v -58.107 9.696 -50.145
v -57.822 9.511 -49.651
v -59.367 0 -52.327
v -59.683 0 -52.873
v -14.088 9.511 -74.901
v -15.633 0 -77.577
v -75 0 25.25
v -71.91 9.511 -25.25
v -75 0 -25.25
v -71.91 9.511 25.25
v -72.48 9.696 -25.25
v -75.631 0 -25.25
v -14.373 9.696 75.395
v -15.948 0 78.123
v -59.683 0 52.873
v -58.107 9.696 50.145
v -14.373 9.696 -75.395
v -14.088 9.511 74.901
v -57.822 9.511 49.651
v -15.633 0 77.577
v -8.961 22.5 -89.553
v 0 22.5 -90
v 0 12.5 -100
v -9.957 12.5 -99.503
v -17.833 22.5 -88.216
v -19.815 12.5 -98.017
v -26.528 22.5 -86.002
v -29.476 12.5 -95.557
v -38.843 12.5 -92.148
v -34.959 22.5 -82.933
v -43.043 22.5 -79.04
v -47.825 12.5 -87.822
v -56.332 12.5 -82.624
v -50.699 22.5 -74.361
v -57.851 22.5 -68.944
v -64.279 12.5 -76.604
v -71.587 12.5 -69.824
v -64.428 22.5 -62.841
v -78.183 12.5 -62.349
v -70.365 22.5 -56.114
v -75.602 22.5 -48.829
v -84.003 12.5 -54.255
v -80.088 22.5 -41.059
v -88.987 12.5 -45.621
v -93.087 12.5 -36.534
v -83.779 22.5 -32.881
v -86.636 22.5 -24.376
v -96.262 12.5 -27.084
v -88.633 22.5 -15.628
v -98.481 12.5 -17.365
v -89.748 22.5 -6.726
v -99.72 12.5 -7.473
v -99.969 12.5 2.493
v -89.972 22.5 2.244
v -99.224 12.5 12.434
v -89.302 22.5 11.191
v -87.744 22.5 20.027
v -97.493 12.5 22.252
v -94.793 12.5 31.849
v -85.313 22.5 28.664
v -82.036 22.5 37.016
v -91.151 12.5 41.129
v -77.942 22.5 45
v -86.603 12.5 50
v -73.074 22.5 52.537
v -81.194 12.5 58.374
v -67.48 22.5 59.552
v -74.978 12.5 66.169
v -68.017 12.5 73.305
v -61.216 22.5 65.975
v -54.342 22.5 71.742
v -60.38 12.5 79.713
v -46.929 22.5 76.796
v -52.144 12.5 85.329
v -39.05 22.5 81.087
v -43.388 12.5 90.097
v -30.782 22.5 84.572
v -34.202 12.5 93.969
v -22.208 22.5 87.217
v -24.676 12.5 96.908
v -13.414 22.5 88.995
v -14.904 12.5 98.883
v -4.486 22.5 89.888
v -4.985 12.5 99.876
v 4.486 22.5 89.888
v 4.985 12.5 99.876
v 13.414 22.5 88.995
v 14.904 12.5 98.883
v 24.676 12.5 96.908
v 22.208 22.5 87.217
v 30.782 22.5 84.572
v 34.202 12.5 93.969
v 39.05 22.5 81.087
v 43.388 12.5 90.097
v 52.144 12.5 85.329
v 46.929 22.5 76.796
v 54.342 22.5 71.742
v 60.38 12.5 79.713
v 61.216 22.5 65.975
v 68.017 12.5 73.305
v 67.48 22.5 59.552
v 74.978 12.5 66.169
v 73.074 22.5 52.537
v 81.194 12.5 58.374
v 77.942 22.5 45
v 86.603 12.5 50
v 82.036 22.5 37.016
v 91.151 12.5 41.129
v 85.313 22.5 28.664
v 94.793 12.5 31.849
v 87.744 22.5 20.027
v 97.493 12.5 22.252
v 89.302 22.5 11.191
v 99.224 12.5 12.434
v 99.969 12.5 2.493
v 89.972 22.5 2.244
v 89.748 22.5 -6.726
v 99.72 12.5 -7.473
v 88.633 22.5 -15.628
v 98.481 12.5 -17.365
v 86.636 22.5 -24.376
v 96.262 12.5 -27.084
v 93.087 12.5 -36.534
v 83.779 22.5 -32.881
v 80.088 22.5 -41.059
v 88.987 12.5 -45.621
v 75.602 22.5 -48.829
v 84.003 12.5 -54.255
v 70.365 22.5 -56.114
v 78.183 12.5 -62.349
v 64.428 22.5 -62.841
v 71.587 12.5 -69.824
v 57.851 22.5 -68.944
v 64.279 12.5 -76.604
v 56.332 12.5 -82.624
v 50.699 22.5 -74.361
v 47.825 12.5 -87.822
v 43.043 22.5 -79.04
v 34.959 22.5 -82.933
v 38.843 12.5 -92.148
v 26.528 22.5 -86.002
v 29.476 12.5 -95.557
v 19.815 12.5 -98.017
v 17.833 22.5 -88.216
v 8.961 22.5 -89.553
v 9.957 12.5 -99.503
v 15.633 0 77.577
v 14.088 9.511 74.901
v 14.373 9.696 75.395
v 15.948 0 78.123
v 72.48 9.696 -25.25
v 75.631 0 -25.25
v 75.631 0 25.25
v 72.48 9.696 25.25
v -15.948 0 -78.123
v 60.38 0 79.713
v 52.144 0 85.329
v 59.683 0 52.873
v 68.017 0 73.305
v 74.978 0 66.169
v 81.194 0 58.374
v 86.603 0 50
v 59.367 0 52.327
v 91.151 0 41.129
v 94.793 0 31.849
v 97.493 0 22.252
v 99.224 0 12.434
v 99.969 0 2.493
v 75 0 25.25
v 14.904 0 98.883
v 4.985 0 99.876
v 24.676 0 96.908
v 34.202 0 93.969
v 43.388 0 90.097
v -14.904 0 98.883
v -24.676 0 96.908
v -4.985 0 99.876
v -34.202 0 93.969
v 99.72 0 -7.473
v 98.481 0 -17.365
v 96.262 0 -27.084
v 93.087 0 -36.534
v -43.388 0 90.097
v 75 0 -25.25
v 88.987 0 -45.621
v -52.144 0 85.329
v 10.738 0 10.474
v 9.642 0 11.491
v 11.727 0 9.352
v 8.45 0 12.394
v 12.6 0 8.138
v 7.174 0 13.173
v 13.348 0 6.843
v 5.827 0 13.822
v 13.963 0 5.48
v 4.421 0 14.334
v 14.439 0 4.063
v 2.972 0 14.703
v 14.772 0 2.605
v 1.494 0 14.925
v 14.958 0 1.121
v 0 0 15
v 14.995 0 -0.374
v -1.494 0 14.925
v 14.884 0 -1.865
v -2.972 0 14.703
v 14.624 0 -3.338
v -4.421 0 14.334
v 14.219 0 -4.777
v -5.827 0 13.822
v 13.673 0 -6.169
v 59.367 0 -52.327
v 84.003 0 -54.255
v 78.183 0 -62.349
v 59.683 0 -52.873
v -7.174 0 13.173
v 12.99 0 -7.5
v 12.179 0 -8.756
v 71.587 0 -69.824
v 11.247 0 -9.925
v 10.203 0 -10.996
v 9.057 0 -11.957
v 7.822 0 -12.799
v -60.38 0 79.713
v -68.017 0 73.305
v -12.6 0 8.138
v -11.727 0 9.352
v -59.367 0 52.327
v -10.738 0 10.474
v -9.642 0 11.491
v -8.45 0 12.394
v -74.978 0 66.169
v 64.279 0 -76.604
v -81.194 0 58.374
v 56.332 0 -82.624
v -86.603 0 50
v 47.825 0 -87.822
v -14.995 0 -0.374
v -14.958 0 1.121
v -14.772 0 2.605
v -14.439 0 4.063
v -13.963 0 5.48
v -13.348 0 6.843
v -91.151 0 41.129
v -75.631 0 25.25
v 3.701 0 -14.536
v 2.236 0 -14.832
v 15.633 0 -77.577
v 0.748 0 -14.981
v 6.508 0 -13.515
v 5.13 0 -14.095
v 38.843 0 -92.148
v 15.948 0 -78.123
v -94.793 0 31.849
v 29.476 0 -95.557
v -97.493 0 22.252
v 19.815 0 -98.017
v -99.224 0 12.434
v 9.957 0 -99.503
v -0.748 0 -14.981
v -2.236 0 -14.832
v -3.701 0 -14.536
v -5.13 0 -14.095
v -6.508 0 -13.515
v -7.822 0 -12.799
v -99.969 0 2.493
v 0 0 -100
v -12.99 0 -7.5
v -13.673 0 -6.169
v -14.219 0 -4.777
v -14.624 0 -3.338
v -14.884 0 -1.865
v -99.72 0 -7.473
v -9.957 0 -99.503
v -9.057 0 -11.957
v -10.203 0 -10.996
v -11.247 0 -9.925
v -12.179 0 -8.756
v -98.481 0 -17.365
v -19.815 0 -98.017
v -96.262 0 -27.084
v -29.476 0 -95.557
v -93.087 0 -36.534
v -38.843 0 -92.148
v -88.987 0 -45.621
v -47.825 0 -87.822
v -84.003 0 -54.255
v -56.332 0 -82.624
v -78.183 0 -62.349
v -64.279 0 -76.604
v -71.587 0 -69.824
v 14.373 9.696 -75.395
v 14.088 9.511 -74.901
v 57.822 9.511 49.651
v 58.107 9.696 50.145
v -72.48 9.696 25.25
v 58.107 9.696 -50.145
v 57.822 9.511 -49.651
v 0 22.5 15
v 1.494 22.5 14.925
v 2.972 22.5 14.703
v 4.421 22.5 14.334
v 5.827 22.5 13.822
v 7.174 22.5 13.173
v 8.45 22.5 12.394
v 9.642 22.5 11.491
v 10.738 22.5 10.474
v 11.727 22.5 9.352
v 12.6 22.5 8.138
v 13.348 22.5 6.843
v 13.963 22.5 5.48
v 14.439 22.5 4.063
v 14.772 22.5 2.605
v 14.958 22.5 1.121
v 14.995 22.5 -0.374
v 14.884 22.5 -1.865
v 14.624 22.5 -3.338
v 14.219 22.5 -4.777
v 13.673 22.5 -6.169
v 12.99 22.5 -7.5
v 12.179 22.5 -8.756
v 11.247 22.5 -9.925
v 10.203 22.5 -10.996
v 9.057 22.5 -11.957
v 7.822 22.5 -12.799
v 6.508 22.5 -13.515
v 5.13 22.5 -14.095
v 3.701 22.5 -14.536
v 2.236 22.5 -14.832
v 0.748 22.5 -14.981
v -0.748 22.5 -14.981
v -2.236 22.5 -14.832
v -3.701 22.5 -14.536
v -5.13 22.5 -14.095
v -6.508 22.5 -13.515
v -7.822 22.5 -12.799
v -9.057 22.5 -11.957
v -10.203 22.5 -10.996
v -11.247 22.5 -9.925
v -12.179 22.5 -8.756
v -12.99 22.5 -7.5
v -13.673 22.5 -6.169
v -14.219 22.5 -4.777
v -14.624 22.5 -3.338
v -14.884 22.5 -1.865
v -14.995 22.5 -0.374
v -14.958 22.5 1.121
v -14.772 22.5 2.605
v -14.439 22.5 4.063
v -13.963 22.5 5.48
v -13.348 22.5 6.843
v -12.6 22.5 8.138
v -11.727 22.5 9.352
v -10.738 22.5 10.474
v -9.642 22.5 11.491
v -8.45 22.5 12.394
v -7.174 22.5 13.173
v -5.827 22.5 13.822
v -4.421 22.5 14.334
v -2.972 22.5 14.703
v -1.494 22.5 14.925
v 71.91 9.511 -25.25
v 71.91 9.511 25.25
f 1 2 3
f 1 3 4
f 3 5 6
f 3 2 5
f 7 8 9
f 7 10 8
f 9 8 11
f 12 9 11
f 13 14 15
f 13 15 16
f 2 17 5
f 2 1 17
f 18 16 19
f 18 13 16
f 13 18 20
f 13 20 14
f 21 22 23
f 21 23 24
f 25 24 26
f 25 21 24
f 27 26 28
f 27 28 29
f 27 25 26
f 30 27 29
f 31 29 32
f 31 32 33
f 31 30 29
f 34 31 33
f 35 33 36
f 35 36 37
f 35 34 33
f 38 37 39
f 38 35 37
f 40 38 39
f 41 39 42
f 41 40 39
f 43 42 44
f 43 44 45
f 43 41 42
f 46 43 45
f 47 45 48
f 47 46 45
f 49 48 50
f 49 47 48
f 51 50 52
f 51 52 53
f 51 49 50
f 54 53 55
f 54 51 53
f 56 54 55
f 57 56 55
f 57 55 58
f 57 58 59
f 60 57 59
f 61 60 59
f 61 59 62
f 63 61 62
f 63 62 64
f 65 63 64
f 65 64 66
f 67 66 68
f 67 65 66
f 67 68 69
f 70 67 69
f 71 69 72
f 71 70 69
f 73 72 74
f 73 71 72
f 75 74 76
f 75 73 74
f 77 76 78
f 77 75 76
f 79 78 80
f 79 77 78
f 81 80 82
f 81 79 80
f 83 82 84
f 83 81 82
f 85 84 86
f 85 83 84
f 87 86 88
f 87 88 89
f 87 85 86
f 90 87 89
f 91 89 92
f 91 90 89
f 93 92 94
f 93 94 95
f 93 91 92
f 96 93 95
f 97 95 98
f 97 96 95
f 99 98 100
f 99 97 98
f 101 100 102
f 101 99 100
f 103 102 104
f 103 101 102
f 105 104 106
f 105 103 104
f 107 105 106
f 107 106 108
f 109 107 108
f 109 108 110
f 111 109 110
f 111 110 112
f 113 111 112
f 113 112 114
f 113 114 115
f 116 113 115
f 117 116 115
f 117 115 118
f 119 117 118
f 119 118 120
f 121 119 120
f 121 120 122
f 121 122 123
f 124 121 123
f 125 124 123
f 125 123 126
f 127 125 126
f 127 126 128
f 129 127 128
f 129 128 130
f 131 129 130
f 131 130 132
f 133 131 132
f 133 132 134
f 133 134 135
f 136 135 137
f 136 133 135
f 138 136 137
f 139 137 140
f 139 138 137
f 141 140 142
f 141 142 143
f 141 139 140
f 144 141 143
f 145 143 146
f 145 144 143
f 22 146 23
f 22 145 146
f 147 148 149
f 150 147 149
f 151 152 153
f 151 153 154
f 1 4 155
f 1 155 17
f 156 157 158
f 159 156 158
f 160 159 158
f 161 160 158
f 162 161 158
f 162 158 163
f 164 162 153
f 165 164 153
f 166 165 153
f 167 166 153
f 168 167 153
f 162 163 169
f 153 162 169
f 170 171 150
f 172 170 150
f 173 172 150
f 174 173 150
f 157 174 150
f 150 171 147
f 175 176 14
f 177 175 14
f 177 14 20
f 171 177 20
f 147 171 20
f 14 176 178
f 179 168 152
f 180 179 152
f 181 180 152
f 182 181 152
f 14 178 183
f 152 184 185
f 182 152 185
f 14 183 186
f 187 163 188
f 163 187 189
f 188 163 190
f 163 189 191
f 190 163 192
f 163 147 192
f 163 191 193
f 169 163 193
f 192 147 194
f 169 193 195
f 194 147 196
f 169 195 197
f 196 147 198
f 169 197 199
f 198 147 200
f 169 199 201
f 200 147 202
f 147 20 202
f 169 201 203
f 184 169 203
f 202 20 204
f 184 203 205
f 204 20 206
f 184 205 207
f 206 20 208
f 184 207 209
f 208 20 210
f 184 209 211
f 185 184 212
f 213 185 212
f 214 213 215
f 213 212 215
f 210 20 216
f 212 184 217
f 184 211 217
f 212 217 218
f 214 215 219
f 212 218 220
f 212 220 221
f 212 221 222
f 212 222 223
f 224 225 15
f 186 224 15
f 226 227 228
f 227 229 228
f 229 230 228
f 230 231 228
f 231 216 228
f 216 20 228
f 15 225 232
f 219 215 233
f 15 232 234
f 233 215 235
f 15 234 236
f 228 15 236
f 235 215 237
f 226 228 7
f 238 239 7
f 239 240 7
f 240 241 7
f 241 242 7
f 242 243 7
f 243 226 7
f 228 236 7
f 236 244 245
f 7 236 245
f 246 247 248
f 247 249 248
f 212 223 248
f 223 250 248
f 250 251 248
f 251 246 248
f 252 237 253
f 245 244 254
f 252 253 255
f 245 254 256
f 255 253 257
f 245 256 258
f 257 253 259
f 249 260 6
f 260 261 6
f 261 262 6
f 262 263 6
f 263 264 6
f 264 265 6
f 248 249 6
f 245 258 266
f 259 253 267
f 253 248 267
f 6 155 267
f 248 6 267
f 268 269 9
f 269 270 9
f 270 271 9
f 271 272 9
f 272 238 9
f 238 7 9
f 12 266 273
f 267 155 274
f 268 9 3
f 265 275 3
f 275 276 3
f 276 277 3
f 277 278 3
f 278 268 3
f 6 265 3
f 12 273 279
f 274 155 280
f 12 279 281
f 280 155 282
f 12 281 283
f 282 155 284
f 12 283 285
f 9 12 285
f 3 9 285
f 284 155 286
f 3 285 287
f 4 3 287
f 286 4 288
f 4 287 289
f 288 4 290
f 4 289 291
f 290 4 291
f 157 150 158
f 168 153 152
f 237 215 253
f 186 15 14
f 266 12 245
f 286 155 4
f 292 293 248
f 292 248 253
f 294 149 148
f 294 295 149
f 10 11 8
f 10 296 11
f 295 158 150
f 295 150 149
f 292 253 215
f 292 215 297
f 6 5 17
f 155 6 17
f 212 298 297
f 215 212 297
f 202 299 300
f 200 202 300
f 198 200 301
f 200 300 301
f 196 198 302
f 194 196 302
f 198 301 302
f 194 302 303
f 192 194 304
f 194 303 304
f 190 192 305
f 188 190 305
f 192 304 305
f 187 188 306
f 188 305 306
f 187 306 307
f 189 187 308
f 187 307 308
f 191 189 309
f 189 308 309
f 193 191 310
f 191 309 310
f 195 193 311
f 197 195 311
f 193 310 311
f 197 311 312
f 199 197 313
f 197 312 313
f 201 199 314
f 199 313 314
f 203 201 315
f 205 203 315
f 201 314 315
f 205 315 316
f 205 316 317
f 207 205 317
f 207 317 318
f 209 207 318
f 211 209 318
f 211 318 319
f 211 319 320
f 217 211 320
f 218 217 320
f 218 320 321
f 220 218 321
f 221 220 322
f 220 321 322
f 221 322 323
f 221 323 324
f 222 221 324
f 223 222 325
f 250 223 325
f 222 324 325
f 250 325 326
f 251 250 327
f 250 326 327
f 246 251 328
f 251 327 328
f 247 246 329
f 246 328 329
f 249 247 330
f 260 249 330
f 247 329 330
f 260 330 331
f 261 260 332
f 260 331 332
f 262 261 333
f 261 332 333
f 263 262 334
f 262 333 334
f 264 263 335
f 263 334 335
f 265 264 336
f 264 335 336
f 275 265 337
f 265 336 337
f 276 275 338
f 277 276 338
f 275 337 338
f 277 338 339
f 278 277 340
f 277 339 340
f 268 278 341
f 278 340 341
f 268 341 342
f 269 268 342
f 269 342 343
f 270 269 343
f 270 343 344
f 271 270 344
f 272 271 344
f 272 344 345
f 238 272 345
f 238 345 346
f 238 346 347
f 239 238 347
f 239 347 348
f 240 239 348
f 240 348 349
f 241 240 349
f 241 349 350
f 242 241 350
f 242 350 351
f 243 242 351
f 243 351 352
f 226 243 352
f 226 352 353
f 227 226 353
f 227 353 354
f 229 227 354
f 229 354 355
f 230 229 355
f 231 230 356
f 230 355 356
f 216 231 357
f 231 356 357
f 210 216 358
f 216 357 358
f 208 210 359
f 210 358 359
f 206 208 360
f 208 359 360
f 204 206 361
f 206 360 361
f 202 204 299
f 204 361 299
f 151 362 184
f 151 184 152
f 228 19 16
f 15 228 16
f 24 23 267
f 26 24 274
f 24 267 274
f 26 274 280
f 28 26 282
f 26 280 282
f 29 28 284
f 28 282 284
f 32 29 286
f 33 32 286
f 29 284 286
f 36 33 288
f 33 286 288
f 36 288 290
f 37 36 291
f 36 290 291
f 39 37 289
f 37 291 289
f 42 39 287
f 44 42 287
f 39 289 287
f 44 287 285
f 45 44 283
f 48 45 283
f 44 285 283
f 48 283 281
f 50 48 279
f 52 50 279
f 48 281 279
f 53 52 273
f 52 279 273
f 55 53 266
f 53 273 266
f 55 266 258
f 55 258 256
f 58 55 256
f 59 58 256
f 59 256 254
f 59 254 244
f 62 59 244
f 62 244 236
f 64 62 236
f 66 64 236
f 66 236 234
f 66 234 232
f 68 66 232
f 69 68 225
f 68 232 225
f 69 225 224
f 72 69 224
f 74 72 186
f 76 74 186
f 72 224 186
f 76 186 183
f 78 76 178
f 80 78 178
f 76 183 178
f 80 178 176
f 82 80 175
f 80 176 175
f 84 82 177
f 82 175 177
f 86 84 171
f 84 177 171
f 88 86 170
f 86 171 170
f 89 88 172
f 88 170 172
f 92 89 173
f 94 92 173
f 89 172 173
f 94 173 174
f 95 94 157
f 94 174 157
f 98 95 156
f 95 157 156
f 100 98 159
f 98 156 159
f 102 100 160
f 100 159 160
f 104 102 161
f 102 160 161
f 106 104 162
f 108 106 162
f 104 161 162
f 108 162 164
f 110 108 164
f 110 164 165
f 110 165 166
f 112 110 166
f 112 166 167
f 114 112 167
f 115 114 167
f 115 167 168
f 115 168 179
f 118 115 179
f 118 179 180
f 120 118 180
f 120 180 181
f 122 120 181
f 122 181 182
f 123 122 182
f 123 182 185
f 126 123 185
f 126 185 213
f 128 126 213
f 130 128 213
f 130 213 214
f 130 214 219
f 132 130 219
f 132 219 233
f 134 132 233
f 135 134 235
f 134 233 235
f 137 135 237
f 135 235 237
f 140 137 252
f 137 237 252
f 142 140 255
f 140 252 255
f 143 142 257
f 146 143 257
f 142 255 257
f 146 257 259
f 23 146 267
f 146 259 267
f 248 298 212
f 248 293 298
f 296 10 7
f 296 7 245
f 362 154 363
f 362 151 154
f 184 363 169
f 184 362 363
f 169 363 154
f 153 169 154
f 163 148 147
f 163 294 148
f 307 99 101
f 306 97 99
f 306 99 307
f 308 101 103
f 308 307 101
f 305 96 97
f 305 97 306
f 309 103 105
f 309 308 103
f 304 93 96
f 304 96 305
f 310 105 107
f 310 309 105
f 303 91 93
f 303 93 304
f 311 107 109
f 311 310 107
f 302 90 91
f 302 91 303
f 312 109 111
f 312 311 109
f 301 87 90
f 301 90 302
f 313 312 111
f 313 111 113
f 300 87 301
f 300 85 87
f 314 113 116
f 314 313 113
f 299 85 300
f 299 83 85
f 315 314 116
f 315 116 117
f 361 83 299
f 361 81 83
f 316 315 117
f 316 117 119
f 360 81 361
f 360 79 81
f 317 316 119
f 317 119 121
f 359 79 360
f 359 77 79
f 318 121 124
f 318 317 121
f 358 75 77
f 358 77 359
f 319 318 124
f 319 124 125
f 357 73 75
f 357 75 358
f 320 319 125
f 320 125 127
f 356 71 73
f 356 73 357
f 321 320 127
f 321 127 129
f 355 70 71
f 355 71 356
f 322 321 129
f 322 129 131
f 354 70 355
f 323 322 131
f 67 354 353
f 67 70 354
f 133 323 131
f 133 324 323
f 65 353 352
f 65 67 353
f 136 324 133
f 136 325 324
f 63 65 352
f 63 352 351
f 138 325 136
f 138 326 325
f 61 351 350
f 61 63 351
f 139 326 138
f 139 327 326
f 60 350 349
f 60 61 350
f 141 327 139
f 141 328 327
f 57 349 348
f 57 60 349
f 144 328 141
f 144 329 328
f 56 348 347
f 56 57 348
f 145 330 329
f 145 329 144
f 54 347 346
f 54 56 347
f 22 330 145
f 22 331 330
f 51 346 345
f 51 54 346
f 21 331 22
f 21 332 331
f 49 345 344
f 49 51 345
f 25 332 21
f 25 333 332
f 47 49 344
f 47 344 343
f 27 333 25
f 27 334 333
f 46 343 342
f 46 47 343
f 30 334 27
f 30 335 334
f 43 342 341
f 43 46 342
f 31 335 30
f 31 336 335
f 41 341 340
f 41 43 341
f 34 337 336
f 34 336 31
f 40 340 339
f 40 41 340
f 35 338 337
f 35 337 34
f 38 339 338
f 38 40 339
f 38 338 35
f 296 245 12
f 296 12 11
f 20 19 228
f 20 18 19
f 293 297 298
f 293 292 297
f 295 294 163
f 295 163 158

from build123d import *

# Parameters (mm, degrees)
SKETCH3_R           = 100
BOSS_EXTRUDE1_DEPTH = 22.5
CHAMFER1_SIZE       = 10
CUT_EXTRUDE1_DEPTH  = 25.25
CIRPATTERN1_COUNT   = 6
SKETCH5_R           = 15
CUT_EXTRUDE2_DEPTH  = 22.5


with BuildPart() as part:
    # Sketch3 → Boss-Extrude1 (new body)
    with BuildSketch(Plane(origin=(0, 0, 0), x_dir=(1, 0, 0), z_dir=(0, 1, 0))):
        with Locations(Location((0, 0, 0), (0, 0, 90))):
            Circle(SKETCH3_R)
    extrude(amount=BOSS_EXTRUDE1_DEPTH)

    # Chamfer1
    chamfer1_edges = [part.edges().sort_by_distance(p)[0] for p in [
        (0, 22.5, 100),
    ]]
    chamfer(chamfer1_edges, length=CHAMFER1_SIZE)

    # Sketch4 → Cut-Extrude1 (cut, symmetric)
    with BuildSketch(Plane.XY):
        Polygon((-75.630877335, 0), (-72.480463966, 9.69597536), (-71.909830056, 9.510565163), (-75, 0), align=None)
    cut_extrude1 = extrude(amount=CUT_EXTRUDE1_DEPTH, both=True, mode=Mode.SUBTRACT)

    # CirPattern1: Cut-Extrude1 ×6 about axis
    cirpattern1_axis = Axis((0, 0, 0), (0, 1, 0))
    for i in range(1, CIRPATTERN1_COUNT):
        add(cut_extrude1.rotate(cirpattern1_axis, i * 360 / CIRPATTERN1_COUNT), mode=Mode.SUBTRACT)

    # Sketch5 → Cut-Extrude2 (cut)
    with BuildSketch(Plane(origin=(0, 22.5, 0), x_dir=(1, 0, 0), z_dir=(0, 1, 0))):
        with Locations(Location((0, 0, 0), (0, 0, 270))):
            Circle(SKETCH5_R)
    extrude(amount=-CUT_EXTRUDE2_DEPTH, mode=Mode.SUBTRACT)


solid = part.part
